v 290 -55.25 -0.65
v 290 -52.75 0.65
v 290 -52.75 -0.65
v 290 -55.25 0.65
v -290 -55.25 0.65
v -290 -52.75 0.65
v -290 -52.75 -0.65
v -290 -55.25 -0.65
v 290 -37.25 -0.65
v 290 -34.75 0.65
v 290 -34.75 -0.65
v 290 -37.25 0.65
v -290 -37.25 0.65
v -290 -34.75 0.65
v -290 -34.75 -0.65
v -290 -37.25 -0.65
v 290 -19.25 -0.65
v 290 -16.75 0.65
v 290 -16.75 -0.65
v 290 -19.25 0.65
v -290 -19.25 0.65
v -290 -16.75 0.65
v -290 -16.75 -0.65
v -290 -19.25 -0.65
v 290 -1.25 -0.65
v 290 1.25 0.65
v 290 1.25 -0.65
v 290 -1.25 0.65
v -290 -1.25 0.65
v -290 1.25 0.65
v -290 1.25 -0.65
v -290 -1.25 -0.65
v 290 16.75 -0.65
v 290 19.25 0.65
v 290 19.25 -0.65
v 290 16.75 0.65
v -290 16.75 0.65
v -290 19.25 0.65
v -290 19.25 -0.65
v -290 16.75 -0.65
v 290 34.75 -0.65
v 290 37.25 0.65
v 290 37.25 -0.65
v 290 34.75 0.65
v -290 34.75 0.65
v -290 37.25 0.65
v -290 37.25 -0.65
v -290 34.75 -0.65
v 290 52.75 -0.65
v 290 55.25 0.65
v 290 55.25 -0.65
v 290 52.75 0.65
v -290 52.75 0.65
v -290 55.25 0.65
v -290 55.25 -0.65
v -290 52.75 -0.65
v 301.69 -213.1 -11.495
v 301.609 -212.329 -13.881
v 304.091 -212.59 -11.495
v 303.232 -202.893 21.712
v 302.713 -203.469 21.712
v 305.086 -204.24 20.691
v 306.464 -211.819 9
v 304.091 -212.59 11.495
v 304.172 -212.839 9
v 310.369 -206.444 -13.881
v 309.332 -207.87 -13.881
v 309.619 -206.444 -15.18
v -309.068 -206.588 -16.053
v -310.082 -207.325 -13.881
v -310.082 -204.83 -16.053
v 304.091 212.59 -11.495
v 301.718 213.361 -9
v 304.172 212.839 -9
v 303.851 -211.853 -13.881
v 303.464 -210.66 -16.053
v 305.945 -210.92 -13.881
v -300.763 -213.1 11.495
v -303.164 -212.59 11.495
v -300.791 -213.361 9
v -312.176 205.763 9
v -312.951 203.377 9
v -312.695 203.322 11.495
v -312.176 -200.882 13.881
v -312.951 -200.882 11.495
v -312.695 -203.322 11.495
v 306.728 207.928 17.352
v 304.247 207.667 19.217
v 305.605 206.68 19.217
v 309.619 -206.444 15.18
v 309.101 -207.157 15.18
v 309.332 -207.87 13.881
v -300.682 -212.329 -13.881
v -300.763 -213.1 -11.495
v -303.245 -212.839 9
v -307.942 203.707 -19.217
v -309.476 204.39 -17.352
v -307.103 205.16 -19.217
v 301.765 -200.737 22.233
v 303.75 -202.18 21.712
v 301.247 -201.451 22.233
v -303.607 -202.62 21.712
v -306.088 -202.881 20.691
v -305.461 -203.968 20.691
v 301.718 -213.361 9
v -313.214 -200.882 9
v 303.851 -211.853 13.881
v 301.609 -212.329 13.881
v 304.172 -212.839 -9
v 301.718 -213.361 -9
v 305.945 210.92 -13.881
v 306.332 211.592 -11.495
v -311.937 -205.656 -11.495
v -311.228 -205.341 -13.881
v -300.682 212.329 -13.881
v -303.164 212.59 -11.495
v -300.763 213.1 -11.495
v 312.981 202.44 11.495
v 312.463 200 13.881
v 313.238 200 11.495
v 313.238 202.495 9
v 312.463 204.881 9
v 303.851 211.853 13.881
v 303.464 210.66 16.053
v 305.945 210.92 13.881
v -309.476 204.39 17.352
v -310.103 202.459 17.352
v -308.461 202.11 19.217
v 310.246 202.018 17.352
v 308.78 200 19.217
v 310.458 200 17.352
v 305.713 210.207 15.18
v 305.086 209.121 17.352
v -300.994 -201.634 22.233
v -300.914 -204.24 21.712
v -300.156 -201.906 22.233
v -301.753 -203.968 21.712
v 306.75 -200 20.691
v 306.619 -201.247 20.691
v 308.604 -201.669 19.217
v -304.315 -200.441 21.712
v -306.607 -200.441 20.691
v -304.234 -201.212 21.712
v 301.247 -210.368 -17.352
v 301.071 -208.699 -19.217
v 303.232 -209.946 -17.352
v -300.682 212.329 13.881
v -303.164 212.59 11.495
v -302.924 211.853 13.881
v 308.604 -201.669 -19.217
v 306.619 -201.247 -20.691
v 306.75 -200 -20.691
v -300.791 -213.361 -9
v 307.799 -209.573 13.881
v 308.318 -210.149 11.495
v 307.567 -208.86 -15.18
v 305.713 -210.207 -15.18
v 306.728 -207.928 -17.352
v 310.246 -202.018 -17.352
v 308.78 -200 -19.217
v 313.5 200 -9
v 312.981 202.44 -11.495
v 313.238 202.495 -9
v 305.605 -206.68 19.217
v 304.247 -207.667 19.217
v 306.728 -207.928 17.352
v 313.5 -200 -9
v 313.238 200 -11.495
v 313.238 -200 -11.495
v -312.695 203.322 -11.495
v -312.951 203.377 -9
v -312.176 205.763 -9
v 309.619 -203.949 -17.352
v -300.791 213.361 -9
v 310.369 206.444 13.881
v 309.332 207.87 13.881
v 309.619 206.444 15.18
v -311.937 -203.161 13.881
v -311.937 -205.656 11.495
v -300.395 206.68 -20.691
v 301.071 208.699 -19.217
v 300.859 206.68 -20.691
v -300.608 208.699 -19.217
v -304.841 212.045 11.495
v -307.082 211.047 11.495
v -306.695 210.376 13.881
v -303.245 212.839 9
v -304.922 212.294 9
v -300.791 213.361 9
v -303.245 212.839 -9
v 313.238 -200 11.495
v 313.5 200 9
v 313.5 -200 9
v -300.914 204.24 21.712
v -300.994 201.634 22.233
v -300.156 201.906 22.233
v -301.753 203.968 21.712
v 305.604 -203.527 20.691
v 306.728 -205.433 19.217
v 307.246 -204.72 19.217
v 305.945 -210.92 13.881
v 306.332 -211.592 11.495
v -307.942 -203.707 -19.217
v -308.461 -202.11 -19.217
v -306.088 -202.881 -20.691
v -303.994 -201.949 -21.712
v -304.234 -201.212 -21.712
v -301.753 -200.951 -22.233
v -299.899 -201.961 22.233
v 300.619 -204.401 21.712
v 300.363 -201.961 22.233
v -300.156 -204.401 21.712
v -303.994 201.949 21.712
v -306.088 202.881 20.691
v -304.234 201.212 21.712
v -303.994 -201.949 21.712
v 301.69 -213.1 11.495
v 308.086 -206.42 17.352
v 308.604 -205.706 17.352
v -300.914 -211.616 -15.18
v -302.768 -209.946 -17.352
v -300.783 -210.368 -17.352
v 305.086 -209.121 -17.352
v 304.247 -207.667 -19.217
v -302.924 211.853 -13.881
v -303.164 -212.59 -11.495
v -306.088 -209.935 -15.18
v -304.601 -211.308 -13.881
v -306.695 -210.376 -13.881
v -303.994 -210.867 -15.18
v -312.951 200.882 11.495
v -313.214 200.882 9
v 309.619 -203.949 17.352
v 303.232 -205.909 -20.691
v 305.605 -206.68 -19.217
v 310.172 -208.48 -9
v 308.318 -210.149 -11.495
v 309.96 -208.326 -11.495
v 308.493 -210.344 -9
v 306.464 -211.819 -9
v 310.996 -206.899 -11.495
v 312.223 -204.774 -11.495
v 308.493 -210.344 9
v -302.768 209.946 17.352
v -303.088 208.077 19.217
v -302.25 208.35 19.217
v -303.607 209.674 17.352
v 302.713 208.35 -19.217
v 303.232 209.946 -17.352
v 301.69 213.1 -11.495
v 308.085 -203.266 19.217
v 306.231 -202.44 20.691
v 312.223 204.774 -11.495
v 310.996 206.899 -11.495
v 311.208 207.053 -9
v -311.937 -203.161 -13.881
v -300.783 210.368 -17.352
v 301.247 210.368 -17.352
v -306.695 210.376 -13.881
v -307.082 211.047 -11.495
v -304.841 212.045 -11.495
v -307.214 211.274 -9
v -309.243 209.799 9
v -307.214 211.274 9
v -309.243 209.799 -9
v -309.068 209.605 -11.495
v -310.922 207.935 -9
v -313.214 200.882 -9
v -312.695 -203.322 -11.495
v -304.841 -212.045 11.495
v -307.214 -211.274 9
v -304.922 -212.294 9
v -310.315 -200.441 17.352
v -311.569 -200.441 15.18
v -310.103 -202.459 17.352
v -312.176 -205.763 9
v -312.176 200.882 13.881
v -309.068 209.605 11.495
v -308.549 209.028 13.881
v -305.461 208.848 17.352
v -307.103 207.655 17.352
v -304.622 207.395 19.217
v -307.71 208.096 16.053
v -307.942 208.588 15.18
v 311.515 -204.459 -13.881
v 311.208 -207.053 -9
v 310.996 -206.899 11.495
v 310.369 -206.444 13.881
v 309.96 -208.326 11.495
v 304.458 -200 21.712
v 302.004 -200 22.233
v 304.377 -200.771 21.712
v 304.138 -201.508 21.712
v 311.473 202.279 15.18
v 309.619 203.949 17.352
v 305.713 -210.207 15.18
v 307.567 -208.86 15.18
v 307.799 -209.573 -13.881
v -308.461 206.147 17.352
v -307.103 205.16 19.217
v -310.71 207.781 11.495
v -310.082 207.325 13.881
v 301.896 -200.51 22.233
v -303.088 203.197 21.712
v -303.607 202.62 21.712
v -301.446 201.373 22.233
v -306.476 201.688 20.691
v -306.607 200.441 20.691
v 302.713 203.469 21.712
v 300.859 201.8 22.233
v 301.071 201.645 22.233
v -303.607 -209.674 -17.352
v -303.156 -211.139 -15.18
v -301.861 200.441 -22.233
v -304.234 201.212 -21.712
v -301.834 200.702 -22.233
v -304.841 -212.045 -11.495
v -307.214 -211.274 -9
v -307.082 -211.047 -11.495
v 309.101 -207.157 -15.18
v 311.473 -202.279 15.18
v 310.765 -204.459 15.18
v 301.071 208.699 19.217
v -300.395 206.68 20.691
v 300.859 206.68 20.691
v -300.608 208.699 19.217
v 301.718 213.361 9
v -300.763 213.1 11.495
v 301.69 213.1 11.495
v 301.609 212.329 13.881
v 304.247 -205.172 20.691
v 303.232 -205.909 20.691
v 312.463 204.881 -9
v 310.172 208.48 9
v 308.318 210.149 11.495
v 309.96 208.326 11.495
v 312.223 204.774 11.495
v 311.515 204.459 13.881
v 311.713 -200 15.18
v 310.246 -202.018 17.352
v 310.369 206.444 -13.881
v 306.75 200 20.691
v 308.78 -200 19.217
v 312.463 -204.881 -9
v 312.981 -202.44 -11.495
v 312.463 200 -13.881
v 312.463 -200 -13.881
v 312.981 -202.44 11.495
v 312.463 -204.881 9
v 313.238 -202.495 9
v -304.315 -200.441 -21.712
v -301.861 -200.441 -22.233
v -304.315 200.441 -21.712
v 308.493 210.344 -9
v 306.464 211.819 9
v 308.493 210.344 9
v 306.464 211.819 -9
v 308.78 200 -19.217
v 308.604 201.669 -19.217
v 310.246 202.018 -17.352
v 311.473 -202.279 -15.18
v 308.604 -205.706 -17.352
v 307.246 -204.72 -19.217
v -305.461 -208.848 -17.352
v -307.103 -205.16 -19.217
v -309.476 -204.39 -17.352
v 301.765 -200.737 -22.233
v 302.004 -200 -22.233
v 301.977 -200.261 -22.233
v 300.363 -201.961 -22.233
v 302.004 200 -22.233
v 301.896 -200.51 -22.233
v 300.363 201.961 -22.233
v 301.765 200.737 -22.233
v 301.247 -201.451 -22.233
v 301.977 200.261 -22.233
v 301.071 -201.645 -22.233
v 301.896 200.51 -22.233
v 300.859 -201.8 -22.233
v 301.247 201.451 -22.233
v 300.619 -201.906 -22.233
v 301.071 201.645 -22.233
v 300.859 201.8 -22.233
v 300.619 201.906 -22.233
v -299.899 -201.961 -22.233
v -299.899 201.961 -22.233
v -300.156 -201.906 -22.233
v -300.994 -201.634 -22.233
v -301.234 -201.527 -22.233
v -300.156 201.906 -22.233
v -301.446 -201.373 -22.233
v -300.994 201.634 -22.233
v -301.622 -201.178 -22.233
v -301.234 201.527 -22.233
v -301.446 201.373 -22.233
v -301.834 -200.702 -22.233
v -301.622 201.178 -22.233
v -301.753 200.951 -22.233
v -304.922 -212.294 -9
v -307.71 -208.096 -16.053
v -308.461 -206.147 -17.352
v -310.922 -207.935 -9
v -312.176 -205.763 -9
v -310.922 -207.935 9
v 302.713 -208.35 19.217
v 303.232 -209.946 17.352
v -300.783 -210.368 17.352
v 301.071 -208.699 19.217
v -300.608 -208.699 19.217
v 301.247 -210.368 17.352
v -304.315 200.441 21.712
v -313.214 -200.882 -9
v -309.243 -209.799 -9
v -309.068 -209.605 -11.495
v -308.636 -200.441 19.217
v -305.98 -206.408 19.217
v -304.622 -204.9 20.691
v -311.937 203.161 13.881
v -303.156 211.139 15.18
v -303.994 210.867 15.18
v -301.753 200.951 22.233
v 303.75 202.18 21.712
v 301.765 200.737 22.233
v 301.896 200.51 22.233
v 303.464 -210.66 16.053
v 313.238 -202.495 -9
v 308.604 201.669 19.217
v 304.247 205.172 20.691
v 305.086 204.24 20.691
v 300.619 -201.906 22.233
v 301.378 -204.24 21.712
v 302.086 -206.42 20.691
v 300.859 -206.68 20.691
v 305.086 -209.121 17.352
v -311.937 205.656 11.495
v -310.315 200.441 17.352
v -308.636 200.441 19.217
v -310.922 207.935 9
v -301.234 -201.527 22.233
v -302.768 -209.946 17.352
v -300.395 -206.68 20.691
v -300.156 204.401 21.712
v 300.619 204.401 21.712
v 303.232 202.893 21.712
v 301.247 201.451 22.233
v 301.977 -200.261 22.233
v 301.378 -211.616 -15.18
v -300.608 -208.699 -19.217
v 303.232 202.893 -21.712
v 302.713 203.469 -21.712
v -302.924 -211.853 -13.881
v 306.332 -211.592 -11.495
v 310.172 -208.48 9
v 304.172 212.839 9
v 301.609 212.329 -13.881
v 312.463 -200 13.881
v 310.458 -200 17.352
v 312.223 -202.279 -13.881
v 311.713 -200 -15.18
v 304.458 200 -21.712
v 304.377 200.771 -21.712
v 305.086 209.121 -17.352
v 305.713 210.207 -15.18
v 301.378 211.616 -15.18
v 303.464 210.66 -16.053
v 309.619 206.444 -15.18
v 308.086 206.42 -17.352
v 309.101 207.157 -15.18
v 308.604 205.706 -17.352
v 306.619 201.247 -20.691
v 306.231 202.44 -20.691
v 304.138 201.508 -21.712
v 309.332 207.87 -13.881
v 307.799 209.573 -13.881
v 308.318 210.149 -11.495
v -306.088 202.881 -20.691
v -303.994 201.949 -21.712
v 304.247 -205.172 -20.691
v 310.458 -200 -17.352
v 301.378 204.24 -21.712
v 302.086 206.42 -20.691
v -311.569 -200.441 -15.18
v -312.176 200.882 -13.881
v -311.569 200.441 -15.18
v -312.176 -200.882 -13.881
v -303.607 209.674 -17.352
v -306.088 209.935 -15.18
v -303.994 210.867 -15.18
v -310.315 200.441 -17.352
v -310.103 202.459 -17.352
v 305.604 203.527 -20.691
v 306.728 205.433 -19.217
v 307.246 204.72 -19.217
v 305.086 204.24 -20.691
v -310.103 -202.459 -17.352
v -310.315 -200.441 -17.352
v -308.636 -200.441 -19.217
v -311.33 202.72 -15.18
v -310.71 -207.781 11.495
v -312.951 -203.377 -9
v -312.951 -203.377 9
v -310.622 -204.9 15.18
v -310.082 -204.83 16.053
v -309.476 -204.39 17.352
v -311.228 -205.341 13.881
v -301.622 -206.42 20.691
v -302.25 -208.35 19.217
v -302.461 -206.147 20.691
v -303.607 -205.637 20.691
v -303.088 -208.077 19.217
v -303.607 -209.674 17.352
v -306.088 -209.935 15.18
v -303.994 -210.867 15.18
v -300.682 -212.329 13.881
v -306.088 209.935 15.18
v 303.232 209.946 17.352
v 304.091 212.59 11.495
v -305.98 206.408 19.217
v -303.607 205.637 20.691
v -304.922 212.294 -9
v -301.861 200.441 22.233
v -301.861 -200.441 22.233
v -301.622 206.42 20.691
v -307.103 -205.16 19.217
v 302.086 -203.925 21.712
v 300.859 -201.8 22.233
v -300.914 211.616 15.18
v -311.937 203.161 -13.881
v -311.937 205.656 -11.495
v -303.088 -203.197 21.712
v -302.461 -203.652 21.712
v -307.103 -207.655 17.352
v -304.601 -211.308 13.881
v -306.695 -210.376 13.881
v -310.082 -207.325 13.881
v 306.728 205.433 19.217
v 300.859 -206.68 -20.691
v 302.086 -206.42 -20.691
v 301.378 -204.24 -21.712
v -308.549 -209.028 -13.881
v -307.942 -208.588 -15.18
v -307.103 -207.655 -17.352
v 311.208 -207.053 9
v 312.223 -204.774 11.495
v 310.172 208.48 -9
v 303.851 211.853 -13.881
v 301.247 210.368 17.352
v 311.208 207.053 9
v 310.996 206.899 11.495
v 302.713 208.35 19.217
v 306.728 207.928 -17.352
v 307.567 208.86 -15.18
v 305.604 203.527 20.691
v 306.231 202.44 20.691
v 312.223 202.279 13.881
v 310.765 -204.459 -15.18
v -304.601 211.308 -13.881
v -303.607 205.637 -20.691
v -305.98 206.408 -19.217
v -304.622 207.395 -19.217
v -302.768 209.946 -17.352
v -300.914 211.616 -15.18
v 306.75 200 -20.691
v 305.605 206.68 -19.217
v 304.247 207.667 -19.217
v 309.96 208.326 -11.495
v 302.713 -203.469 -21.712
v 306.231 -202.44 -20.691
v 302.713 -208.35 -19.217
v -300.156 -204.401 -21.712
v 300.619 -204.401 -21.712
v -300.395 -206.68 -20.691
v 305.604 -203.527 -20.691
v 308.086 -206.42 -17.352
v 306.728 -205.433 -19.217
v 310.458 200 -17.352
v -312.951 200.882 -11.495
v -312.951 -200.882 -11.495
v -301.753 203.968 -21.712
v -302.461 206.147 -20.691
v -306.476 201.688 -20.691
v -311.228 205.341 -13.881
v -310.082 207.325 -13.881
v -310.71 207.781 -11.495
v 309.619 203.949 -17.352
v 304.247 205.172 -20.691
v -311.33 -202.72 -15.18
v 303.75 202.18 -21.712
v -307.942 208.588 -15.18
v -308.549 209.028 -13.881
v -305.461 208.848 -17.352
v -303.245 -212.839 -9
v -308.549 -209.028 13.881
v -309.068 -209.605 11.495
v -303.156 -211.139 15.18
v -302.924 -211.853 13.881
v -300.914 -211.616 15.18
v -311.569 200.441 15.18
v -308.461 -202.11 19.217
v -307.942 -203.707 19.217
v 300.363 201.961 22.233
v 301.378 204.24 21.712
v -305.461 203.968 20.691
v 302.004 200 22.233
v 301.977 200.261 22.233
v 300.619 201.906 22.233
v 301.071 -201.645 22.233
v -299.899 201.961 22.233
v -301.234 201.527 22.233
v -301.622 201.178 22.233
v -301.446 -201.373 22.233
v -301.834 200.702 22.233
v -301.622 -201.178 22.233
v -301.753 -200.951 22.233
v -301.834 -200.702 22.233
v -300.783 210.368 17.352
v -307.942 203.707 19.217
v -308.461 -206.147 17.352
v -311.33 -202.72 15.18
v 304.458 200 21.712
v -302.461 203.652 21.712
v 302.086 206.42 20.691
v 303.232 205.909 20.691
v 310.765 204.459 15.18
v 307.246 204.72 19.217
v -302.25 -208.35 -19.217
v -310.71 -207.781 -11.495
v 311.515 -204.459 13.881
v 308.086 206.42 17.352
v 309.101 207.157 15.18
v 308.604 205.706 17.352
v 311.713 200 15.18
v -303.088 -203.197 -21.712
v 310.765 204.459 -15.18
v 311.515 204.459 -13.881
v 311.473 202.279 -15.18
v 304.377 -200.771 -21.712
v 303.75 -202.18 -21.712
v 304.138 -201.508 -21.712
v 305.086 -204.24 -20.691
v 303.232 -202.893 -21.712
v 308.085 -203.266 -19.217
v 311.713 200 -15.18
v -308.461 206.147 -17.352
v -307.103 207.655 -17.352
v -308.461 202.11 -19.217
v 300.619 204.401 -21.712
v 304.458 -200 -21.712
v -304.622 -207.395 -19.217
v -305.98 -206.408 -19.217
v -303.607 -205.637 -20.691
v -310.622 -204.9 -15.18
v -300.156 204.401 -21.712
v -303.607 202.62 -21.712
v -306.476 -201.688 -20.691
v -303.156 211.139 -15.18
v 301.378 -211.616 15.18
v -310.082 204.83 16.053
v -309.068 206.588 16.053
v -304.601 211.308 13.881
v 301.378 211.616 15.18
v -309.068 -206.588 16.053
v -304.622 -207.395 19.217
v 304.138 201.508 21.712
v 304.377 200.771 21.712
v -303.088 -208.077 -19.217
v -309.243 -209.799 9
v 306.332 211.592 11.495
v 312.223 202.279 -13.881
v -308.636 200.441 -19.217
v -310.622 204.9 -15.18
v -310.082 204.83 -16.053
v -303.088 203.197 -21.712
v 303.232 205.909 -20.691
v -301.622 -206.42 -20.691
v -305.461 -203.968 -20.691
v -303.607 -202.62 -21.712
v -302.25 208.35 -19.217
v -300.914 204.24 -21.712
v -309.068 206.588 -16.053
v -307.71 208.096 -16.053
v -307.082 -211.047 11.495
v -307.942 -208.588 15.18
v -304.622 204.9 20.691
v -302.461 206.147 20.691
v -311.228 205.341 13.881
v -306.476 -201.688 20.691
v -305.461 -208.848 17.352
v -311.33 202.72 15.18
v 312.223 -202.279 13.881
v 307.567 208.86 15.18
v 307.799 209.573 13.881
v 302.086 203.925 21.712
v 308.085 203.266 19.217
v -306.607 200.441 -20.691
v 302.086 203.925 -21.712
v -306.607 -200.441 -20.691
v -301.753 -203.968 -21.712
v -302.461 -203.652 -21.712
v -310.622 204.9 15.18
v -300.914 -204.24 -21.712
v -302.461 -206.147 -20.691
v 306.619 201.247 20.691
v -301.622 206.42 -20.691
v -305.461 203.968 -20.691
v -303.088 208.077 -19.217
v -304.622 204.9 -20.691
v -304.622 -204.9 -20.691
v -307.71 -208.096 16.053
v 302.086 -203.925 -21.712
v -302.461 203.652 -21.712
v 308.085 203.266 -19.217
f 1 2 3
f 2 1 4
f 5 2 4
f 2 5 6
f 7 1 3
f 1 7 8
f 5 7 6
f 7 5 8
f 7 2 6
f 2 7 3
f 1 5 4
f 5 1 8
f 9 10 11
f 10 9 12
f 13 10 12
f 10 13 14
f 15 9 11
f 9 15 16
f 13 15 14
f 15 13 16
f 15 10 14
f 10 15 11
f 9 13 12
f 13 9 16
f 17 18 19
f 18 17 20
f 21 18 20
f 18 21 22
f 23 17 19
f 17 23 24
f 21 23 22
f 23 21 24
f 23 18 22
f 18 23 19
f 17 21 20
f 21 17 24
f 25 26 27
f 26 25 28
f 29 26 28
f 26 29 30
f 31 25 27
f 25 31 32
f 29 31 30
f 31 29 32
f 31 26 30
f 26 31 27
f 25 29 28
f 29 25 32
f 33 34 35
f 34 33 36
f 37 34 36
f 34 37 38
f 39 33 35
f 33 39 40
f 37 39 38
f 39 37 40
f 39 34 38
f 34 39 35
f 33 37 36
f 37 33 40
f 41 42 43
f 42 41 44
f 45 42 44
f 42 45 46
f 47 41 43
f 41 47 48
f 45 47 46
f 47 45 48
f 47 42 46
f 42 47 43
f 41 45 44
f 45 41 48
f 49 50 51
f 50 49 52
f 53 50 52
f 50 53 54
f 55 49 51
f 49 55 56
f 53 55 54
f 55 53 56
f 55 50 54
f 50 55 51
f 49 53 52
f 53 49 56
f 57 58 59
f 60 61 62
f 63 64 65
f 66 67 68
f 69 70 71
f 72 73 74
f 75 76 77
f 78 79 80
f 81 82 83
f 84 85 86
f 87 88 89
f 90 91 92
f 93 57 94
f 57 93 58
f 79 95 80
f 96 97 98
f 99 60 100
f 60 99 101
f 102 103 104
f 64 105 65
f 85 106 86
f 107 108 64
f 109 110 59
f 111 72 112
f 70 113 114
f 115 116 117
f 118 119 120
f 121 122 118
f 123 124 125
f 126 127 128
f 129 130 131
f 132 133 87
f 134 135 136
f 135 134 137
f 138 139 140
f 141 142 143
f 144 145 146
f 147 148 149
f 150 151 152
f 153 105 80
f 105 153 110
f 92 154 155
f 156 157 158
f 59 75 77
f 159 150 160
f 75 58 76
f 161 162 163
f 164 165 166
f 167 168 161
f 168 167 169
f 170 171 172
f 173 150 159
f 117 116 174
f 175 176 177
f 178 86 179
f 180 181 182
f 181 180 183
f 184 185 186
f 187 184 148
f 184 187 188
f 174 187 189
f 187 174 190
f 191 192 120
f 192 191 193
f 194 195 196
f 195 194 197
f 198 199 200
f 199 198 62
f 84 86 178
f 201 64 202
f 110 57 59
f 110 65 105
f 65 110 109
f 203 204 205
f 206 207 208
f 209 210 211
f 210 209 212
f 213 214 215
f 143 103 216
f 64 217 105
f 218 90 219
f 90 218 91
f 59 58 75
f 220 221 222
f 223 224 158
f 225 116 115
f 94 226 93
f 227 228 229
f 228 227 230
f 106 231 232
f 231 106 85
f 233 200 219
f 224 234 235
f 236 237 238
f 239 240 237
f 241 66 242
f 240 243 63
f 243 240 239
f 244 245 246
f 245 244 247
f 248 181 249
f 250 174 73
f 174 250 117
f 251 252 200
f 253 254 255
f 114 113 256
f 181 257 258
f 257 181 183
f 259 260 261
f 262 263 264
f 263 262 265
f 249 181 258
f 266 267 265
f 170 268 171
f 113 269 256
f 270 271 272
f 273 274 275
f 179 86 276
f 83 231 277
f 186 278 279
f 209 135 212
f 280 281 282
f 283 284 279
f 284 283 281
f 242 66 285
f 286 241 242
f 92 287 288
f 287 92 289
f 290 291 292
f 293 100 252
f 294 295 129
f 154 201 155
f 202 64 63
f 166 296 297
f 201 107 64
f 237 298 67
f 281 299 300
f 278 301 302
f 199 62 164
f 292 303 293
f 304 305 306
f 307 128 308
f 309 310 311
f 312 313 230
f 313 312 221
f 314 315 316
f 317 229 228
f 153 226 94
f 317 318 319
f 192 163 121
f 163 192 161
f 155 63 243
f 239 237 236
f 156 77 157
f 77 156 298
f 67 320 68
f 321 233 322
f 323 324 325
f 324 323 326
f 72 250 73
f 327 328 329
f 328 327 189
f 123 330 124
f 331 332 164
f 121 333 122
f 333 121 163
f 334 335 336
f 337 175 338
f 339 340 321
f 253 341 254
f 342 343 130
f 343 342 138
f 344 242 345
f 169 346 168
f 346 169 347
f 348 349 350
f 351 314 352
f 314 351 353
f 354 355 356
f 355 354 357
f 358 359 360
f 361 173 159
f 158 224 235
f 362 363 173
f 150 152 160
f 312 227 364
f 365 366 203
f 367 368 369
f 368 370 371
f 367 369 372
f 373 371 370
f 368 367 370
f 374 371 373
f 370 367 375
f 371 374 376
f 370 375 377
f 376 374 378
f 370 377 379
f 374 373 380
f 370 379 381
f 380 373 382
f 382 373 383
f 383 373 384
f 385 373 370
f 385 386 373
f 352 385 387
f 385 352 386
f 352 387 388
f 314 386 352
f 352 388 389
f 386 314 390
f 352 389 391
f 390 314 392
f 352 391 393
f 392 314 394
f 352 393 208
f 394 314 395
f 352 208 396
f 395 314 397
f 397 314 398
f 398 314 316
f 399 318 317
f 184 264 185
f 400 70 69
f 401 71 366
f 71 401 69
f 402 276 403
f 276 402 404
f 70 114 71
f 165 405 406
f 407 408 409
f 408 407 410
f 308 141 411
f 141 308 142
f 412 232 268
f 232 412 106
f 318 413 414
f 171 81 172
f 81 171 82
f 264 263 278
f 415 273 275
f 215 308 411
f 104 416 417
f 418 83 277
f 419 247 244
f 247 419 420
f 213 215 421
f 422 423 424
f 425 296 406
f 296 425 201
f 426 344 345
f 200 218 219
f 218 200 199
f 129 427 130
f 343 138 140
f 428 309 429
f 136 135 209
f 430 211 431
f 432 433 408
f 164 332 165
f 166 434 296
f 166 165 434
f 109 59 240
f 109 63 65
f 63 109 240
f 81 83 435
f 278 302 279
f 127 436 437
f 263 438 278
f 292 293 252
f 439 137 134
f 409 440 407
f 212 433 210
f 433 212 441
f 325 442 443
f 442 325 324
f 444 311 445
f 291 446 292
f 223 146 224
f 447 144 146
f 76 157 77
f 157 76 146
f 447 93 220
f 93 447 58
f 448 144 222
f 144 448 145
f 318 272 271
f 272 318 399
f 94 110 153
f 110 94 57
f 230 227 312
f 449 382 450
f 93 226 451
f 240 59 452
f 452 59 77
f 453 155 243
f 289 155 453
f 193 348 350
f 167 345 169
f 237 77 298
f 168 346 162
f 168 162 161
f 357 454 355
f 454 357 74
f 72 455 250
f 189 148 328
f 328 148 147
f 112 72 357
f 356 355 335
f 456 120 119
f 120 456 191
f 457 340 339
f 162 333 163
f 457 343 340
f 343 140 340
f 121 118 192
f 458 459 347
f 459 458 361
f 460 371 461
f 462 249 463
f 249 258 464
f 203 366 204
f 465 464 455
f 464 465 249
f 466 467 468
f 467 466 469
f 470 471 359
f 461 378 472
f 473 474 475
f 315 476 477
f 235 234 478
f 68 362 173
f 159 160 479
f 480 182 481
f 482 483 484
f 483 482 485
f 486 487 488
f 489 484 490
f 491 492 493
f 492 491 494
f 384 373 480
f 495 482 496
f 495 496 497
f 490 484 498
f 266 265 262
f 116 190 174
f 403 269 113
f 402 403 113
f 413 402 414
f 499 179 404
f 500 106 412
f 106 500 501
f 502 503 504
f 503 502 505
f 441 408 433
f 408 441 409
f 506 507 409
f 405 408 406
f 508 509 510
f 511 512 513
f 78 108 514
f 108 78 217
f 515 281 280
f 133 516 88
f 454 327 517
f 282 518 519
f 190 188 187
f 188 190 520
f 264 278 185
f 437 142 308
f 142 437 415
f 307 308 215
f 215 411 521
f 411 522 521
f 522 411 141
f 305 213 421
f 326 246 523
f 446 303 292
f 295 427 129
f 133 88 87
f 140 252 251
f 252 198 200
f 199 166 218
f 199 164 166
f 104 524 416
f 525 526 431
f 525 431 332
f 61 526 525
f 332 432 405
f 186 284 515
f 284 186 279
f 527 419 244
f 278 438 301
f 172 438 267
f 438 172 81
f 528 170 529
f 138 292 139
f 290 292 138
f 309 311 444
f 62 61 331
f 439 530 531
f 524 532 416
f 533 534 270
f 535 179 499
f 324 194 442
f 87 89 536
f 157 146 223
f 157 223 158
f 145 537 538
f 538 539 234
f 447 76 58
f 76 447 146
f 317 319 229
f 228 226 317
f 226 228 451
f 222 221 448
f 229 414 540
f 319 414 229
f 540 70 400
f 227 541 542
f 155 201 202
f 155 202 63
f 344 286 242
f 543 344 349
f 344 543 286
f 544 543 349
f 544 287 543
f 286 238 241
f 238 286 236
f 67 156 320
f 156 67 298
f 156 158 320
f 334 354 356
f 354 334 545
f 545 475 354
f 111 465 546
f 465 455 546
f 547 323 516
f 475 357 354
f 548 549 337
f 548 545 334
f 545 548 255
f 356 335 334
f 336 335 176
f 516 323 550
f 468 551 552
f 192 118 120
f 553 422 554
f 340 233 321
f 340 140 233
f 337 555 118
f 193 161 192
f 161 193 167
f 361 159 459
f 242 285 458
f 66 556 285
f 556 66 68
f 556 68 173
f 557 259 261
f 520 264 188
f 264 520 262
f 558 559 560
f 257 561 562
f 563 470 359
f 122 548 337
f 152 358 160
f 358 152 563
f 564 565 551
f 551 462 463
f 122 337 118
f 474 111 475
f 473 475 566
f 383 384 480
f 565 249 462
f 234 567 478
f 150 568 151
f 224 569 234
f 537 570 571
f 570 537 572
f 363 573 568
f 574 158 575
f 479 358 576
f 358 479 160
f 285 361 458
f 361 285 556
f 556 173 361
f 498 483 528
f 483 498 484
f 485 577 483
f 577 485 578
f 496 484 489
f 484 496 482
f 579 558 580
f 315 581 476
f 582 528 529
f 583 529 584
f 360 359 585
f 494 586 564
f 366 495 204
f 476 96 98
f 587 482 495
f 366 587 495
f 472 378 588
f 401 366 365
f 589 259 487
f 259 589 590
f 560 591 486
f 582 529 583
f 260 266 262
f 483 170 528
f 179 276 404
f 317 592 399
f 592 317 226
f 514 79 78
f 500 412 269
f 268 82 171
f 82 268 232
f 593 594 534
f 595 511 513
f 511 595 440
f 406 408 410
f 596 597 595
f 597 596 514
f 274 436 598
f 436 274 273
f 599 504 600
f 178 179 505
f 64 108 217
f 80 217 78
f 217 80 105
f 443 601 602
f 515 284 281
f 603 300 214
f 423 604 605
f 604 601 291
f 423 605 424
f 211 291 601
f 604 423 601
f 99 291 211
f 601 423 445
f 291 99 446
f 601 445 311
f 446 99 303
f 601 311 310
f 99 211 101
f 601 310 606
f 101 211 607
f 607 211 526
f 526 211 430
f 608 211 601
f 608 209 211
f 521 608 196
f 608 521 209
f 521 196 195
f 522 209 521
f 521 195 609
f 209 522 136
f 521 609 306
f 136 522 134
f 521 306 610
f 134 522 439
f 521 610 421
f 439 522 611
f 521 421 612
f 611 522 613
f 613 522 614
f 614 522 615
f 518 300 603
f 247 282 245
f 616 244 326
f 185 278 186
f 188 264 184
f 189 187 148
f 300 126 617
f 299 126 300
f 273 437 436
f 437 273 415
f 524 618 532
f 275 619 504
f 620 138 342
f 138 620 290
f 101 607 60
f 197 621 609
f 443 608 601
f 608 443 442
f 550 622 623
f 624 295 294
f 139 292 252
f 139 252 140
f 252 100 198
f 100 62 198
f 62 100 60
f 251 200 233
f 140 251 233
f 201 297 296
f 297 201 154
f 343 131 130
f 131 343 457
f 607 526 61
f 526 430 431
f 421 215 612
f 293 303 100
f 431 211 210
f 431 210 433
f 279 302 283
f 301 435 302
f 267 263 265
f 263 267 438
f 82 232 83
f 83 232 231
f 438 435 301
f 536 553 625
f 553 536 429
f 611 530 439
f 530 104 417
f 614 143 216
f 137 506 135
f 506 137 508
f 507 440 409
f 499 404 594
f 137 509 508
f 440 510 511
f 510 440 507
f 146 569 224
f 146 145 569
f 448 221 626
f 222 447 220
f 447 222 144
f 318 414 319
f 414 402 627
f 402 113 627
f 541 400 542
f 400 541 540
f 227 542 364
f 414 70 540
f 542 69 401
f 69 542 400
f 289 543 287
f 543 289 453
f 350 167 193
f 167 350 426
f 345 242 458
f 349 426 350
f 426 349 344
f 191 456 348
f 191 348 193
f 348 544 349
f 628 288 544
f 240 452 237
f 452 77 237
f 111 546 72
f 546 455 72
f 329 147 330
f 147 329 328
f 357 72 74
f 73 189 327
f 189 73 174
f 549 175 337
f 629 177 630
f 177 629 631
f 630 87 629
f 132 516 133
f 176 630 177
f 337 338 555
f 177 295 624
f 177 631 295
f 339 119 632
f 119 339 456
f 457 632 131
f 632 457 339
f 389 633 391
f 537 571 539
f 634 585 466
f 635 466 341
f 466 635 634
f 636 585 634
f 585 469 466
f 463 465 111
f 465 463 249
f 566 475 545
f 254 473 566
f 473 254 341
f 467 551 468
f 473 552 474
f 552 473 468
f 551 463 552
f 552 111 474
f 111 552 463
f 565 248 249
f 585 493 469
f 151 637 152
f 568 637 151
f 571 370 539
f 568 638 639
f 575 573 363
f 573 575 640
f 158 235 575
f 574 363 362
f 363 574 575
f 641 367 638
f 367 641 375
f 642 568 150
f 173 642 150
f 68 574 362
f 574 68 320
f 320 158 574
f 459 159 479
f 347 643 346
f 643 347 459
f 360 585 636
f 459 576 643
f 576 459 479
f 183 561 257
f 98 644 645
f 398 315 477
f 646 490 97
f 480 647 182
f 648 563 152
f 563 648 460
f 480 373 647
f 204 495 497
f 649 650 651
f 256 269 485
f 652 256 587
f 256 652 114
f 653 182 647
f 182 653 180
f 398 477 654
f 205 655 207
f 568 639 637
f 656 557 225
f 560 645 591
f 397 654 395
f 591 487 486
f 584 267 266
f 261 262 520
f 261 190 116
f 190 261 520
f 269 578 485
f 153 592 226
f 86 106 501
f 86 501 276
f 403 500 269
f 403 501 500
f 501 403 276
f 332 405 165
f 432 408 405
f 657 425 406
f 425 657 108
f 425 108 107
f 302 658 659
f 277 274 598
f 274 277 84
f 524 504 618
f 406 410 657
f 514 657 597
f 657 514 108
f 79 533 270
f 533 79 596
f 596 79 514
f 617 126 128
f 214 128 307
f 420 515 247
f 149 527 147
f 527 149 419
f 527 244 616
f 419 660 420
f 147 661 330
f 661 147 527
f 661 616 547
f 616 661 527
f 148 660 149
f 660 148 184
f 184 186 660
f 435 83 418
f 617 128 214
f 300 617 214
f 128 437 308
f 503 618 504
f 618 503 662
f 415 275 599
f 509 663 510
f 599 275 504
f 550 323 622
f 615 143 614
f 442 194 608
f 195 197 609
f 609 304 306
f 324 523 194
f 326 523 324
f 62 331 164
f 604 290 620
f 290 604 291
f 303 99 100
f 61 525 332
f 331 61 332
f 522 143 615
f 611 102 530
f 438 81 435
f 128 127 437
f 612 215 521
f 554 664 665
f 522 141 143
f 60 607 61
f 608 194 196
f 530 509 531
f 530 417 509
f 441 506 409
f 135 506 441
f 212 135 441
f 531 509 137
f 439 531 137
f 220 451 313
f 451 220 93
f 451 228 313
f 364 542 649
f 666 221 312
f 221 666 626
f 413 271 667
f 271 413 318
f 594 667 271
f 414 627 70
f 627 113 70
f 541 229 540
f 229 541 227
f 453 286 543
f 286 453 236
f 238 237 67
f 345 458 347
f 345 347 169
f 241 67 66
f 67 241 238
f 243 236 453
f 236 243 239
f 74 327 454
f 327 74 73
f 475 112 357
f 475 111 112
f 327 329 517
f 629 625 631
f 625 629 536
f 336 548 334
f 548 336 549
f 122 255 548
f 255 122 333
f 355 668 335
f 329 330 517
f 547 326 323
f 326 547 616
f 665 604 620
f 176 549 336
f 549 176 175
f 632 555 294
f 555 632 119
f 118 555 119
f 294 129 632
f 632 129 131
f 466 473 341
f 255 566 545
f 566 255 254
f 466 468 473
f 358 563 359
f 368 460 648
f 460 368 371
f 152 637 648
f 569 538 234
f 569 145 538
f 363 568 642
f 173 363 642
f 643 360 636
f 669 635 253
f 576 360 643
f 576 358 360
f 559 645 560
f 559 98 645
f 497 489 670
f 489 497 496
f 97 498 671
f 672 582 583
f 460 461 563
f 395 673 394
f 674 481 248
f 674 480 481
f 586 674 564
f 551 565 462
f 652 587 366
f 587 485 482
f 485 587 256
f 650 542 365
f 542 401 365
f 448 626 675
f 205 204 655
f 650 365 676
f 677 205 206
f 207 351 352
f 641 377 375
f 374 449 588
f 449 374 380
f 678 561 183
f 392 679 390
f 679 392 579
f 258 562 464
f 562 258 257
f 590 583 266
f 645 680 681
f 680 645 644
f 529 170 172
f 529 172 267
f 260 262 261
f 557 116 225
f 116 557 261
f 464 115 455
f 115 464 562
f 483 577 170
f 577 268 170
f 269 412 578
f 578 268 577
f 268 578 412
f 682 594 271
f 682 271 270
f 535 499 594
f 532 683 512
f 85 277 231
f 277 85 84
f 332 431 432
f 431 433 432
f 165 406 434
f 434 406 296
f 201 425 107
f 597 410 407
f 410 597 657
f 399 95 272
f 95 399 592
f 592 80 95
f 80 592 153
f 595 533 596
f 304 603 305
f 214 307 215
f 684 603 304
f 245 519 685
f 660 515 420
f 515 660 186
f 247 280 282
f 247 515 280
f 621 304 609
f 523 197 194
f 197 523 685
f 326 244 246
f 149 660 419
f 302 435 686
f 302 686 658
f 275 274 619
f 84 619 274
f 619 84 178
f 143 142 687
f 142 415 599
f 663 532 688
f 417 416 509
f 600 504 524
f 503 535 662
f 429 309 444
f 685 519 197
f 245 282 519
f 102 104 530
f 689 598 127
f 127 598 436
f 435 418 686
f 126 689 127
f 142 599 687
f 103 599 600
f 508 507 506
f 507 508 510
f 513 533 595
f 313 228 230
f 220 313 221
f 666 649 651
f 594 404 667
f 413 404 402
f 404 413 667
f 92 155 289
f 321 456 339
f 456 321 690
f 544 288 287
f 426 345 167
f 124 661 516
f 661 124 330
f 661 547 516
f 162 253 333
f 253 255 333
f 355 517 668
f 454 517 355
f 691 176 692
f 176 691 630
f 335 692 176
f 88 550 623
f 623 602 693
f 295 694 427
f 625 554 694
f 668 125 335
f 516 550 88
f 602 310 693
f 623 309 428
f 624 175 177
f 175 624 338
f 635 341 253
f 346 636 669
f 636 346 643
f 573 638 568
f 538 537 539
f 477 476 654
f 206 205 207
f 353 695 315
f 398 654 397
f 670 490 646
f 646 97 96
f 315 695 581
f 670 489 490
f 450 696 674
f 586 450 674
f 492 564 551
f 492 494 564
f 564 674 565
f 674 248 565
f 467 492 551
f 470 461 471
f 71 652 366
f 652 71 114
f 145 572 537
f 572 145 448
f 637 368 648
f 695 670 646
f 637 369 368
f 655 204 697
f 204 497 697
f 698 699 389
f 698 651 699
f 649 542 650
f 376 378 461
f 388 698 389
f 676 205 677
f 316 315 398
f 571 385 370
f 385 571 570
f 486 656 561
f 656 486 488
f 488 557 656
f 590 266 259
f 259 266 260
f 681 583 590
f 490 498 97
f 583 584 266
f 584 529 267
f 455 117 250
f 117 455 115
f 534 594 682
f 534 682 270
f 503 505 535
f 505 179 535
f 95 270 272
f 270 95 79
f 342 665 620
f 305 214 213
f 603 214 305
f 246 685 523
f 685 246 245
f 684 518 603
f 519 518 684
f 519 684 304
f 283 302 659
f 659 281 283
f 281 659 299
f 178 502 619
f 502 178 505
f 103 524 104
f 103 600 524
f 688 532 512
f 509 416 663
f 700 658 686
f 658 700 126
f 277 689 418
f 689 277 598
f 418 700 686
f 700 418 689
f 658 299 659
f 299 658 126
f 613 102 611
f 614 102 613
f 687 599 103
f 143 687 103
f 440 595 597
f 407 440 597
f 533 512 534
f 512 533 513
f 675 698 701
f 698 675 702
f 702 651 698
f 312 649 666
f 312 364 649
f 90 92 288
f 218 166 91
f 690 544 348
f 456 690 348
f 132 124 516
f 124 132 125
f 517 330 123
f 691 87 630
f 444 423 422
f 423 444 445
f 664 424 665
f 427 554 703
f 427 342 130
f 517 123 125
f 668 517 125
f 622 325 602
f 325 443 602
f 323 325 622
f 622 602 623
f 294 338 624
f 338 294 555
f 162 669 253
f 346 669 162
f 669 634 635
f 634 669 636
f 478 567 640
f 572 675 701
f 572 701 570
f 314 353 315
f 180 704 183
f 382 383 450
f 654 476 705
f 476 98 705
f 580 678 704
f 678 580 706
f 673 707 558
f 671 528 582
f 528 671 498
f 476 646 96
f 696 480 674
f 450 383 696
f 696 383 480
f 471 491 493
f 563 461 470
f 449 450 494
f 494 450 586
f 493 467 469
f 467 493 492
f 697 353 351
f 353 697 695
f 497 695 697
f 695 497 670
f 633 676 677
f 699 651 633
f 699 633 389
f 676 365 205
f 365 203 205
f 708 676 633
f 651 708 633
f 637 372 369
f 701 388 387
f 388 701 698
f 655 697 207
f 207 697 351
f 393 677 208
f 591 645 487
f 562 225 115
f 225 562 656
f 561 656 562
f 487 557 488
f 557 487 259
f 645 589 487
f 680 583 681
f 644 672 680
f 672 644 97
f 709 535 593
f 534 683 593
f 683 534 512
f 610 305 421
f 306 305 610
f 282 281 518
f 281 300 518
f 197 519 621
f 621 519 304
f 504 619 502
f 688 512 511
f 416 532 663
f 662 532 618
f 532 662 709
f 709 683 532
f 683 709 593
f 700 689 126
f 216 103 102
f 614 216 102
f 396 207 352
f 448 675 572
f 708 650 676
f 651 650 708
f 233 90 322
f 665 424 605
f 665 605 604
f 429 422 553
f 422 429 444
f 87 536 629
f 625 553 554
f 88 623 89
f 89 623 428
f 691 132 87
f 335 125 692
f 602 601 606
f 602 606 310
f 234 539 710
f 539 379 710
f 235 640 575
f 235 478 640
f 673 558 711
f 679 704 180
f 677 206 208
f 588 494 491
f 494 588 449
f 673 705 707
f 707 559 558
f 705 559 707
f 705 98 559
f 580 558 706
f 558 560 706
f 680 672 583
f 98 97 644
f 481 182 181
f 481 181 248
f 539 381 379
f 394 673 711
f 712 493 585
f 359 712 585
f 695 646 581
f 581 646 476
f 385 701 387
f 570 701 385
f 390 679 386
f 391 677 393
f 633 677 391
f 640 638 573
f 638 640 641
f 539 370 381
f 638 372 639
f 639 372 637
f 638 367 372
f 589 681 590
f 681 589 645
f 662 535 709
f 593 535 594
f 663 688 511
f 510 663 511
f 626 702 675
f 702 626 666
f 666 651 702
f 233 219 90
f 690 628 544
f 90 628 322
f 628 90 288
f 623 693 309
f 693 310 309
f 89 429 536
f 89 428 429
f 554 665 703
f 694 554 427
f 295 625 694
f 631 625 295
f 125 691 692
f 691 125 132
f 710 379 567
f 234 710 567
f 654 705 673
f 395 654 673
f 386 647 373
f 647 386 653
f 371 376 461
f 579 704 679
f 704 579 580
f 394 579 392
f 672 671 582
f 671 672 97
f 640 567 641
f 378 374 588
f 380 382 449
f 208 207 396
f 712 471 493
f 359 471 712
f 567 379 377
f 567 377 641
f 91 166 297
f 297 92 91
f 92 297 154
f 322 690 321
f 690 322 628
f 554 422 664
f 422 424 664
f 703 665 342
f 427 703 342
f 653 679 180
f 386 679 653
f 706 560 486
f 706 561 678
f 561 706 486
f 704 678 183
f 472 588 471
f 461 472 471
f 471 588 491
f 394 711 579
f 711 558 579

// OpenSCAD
// Parameters
sheet_length = 600; //[300:1200:1]
sheet_width = 400; //[200:800:1]
sheet_thickness = 18; //[9:36:1]
corner_radius = 12; //[6:24:1]
chamfer_size = 1.5; //[0.5:3:0.1]
grain_depth = 0.3; //[0.1:0.8:0.05]
grain_pitch = 18; //[8:40:1]
grain_groove_width = 2.5; //[1:6:0.1]
grain_margin = 10; //[5:25:1]
overlap = 1; //[0.5:2:0.1]

// Base Shapes
module mdf_sheet() {
  cube([sheet_length, sheet_width, sheet_thickness], center=true);
}

module corner_rounding() {
  sphere(r=corner_radius, center=true);
}

module edge_chamfer() {
  sphere(r=chamfer_size, center=true);
}

module surface_texture_grain() {
  cube([sheet_length - 2*grain_margin, grain_groove_width, grain_depth + overlap], center=true);
}

// Operations
module op_corner_rounding_minkowski() {
  minkowski() {
    mdf_sheet();
    corner_rounding();
  }
}

module op_edge_chamfer_minkowski() {
  minkowski() {
    op_corner_rounding_minkowski();
    edge_chamfer();
  }
}

module op_grain_grooves_union() {
  union() {
    for (i = [-3:3]) {
      translate([0, i * grain_pitch, 0]) surface_texture_grain();
    }
  }
}

module op_sheet_with_grain() {
  difference() {
    op_edge_chamfer_minkowski();
    op_grain_grooves_union();
  }
}

// Final Output
color([0.85, 0.85, 0.8]) // MDF color
op_sheet_with_grain();
